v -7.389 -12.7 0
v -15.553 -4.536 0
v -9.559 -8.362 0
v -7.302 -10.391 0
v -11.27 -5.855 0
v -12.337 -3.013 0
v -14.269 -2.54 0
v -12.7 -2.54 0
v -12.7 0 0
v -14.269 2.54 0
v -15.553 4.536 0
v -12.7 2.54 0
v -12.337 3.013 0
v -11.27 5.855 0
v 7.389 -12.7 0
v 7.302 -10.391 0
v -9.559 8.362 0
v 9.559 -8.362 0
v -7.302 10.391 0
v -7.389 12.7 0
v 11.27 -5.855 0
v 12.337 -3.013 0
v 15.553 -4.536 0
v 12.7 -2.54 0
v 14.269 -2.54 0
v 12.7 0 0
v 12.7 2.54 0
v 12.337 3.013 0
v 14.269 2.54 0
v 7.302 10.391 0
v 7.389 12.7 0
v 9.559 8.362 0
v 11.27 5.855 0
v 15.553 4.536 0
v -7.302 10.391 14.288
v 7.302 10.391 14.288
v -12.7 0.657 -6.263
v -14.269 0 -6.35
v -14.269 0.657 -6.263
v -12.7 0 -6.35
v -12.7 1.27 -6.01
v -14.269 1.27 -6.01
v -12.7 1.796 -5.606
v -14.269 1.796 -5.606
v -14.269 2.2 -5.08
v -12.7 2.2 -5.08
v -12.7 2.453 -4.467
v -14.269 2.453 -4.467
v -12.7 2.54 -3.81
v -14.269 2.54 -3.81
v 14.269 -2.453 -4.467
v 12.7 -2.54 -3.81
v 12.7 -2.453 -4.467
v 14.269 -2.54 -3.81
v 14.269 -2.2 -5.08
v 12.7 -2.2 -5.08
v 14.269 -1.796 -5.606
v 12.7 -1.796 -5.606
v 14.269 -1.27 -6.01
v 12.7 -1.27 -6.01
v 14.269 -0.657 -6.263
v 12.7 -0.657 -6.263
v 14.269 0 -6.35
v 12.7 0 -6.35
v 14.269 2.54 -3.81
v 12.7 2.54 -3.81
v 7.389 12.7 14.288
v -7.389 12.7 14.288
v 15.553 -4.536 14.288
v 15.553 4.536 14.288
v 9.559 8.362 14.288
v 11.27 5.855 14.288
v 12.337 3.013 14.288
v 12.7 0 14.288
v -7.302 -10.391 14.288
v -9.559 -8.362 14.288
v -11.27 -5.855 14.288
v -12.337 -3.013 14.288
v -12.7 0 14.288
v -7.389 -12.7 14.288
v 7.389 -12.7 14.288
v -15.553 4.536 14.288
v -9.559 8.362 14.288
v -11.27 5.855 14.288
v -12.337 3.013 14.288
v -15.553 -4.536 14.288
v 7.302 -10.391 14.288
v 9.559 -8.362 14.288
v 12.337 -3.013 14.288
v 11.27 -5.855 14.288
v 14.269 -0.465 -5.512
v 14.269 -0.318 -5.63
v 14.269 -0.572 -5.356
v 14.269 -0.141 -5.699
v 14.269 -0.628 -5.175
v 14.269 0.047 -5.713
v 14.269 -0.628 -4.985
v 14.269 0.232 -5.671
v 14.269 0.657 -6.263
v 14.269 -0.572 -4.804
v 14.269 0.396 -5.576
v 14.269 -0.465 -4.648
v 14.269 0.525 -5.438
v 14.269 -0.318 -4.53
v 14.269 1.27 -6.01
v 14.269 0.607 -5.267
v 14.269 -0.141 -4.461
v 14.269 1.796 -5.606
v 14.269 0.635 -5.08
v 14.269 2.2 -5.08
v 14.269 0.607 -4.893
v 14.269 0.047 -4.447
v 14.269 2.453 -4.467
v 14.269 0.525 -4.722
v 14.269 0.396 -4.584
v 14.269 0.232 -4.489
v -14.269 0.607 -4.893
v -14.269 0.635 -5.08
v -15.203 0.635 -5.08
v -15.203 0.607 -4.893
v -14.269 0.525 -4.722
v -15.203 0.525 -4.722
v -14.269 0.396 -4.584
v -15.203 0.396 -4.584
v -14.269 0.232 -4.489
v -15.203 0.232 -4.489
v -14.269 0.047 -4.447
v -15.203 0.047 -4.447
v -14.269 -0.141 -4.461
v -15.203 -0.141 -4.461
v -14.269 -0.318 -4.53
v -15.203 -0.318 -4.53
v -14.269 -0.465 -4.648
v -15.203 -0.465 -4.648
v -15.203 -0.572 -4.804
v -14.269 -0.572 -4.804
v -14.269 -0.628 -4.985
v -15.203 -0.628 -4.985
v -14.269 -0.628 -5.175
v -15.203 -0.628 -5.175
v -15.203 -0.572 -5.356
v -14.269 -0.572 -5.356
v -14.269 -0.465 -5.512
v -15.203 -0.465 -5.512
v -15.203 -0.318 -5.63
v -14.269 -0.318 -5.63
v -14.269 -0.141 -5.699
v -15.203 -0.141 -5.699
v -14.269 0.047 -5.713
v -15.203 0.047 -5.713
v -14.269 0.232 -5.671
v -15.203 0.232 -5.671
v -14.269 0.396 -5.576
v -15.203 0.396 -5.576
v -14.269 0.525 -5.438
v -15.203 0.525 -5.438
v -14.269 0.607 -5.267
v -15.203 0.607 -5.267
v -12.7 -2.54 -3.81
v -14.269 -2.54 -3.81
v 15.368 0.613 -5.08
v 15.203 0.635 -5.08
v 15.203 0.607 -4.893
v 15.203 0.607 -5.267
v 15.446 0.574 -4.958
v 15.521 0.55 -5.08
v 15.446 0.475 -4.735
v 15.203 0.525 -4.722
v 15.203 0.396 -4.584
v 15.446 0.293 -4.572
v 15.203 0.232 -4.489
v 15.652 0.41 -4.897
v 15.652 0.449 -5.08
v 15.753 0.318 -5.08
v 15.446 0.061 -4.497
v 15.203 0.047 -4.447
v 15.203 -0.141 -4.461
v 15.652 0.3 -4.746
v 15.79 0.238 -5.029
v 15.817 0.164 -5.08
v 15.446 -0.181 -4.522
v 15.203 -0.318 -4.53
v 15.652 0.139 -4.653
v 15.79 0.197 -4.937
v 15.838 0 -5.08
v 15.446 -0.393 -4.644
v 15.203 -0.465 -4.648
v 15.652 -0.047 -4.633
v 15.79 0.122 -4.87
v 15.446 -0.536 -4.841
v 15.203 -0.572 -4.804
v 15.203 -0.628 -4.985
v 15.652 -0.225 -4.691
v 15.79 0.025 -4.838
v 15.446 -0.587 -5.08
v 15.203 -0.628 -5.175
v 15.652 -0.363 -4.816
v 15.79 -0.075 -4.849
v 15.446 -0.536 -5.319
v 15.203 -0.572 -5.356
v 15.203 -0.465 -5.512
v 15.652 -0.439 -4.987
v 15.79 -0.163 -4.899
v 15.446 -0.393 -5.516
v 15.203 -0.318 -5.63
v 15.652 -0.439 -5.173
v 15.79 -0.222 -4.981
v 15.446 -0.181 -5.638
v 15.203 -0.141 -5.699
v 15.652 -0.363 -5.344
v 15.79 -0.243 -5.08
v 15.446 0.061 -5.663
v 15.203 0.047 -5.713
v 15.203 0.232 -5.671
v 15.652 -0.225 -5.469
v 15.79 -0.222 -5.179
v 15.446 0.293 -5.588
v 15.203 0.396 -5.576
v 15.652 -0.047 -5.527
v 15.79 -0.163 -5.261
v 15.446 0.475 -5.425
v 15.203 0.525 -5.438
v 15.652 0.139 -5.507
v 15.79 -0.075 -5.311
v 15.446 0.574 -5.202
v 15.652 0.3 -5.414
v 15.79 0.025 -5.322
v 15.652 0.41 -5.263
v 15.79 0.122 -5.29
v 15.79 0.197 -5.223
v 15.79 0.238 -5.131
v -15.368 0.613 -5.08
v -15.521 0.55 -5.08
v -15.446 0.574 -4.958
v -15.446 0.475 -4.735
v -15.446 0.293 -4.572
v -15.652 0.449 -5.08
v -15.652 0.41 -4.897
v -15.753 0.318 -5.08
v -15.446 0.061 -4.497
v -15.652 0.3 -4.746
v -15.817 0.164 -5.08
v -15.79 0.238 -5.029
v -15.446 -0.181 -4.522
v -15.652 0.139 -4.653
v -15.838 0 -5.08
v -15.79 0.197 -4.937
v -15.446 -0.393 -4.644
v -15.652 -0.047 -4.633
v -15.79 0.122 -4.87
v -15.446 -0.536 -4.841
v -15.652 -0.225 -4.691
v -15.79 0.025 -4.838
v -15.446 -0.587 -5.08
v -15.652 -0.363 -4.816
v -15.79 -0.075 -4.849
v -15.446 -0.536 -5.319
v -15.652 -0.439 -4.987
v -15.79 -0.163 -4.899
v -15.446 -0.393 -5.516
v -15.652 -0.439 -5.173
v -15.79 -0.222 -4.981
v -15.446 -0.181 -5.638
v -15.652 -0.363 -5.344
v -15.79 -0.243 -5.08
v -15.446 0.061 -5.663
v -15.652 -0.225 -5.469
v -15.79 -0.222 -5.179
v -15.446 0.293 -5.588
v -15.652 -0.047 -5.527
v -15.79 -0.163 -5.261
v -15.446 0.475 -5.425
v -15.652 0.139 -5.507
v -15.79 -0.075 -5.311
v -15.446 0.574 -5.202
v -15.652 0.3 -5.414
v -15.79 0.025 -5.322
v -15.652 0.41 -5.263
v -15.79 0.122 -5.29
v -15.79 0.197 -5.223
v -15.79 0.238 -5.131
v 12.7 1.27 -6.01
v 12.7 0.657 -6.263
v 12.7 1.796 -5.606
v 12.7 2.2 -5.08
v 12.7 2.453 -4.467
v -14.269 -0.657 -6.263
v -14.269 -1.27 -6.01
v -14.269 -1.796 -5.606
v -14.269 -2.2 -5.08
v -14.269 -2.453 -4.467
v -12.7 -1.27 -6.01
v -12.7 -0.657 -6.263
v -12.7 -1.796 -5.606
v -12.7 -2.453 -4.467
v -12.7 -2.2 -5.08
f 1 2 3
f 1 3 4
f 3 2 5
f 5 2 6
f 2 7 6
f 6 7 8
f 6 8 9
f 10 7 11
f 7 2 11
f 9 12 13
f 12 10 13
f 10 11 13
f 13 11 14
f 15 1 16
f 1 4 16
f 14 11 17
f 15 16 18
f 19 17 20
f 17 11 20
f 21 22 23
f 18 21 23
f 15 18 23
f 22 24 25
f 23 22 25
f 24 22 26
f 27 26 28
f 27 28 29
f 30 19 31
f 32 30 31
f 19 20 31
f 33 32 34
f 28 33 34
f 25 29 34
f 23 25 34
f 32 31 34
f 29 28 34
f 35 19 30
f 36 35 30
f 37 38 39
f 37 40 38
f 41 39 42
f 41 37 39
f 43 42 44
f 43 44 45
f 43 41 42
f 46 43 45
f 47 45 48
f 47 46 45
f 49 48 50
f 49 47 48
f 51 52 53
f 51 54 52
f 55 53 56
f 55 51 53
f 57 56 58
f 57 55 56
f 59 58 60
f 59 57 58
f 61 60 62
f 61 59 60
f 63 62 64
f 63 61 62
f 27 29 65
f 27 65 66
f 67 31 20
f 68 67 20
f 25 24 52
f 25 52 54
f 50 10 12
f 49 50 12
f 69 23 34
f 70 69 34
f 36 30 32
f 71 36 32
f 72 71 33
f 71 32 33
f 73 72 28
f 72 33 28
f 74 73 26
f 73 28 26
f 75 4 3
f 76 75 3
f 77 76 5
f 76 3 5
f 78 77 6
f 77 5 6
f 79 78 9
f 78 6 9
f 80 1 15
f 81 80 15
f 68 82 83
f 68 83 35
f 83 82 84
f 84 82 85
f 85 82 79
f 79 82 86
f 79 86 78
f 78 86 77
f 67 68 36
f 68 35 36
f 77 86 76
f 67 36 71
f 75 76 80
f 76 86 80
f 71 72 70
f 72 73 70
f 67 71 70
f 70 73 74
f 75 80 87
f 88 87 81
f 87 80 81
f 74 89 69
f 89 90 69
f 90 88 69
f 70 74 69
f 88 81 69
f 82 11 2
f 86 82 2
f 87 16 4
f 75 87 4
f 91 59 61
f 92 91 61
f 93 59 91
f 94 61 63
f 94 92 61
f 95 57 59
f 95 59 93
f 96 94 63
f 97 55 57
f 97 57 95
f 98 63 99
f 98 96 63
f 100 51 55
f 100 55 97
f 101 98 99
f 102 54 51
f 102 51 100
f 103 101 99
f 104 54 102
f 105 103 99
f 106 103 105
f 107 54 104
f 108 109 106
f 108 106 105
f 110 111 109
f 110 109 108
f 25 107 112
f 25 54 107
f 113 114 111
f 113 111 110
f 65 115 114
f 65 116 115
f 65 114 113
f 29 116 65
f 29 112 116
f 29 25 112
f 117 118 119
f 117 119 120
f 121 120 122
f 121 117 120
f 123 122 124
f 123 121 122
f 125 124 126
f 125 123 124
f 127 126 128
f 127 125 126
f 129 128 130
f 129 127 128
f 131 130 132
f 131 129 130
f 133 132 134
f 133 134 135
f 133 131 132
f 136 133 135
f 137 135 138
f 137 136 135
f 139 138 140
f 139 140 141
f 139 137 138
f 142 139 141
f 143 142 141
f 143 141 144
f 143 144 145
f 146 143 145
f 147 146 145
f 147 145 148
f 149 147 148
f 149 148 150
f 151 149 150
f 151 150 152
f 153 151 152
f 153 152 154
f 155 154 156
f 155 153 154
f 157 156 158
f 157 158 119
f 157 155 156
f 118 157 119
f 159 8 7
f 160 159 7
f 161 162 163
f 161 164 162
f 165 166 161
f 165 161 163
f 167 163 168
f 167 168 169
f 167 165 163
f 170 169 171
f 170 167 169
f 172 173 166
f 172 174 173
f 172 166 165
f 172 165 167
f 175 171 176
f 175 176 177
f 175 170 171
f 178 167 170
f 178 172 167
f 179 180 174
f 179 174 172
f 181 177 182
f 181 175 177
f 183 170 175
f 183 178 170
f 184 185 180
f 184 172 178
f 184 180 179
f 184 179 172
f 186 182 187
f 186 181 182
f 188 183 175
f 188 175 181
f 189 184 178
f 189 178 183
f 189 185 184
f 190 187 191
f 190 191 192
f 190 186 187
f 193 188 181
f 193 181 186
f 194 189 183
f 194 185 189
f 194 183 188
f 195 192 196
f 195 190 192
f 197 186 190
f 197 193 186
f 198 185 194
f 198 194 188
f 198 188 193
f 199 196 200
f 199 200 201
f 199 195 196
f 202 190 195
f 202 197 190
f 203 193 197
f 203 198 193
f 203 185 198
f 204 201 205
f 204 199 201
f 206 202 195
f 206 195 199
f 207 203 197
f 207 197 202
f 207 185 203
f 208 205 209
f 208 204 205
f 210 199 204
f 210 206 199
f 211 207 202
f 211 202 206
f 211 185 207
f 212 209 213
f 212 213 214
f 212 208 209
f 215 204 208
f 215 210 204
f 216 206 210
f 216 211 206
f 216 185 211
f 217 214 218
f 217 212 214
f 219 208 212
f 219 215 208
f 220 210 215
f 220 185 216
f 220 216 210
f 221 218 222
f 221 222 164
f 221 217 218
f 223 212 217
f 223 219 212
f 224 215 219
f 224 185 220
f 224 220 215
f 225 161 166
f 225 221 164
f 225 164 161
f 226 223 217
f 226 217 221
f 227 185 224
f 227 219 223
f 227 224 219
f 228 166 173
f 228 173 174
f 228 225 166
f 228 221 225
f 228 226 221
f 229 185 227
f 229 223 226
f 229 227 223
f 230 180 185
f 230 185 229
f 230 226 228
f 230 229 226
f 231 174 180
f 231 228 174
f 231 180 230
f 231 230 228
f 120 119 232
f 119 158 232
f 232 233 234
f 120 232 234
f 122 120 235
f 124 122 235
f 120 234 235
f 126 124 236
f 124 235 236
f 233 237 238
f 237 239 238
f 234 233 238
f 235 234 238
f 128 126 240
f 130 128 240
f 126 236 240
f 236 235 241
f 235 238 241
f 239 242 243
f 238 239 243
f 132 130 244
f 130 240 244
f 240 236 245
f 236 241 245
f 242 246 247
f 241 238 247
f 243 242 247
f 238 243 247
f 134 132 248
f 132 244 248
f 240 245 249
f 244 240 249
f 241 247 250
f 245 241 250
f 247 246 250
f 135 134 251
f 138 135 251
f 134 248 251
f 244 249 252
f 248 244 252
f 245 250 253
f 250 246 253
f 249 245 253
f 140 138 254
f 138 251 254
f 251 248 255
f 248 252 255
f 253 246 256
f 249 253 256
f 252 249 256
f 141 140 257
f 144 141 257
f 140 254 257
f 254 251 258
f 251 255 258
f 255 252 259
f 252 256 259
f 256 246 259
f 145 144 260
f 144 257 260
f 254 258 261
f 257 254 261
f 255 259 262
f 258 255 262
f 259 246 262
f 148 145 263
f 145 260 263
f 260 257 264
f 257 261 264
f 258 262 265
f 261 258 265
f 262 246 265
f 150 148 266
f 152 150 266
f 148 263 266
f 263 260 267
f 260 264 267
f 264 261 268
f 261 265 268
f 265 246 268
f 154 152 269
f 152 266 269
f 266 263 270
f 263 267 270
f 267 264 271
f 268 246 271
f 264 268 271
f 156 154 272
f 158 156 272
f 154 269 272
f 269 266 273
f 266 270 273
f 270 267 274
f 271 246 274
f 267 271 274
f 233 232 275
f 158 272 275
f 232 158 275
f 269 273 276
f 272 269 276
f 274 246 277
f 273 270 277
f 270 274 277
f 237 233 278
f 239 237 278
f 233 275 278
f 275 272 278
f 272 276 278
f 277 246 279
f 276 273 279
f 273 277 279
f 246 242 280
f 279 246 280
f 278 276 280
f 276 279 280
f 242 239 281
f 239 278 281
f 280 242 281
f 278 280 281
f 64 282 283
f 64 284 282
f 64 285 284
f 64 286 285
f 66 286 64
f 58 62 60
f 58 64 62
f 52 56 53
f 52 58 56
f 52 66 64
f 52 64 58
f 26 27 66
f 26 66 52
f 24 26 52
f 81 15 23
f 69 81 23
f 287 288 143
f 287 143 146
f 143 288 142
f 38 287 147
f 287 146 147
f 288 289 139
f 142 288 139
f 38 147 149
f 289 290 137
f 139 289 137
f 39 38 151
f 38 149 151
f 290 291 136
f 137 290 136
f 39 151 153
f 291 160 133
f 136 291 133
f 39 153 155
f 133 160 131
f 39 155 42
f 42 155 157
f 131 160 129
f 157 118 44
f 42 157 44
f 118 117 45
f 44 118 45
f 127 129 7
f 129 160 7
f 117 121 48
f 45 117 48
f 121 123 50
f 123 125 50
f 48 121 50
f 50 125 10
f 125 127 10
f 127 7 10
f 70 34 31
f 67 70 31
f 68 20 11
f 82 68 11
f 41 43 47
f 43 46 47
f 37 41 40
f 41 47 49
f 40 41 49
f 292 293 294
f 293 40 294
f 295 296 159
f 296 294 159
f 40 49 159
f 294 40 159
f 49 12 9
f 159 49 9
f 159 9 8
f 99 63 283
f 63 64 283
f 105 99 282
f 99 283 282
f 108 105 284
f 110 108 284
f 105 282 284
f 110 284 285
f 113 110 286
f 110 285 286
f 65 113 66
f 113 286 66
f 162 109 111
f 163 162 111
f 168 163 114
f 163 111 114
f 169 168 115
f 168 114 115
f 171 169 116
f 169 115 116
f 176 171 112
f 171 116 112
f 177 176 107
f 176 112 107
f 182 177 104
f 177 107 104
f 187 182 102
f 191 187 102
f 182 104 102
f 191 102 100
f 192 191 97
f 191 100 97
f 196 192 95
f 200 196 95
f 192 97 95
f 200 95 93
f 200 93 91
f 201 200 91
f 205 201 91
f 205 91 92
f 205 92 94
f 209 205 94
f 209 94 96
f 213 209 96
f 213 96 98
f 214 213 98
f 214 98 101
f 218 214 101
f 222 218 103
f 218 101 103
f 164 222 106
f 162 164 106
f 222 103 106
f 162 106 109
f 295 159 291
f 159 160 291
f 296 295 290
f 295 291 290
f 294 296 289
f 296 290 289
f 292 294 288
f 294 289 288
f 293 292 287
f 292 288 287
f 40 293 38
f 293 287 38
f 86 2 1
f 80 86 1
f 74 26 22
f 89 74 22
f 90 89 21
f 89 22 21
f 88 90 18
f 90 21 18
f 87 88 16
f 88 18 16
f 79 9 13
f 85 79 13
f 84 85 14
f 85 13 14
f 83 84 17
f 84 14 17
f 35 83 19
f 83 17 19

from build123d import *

# Parameters (mm, degrees)
F1_DEPTH  = 28.575
F3_DEPTH  = 6.35
F4_R      = 0.635
F5_DEPTH  = 1.5691231
F6_R      = 2.53999
F7_R      = 0.635
F9_DEPTH  = 6.35
F11_D     = 2.54
F16_D     = 127
F16_DEPTH = 20.6385


# Not quite as in the source:
# - a fillet or chamfer is up to 0.001 mm smaller than in the source, because OpenCascade refuses the exact size
# - a length typed as a fraction of an inch, garbled in the dataset ("3 / 203.2 mm" for 3/8 in), is restored
# - the program builds the solid bodies; features that only make, move or delete a surface that nothing else refers to are left out


with BuildPart() as f1:
    # F0 (on Top) → F1 (new body)
    with BuildSketch(Plane.XY):
        Polygon((7.3890909091, 12.7), (0, 12.7), (-7.3890909091, 12.7), (-15.5529601101, 4.536130799), (-15.5529601101, 0), (-15.5529601101, -4.536130799), (-7.3890909091, -12.7), (0, -12.7), (7.3890909091, -12.7), (15.5529601101, -4.536130799), (15.5529601101, 0), (15.5529601101, 4.536130799), align=None)
        with BuildLine():
            ThreePointArc((7.3019865971, 10.3909090909), (11.269987351, 5.8546891556), (12.7, 0))
            ThreePointArc((12.7, 0), (11.269987351, -5.8546891556), (7.3019865971, -10.3909090909))
            Line((7.3019865971, -10.3909090909), (0, -10.3909090909))
            Line((0, -10.3909090909), (-7.3019865971, -10.3909090909))
            ThreePointArc((-7.3019865971, -10.3909090909), (-11.269987351, -5.8546891556), (-12.7, 0))
            ThreePointArc((-12.7, 0), (-11.269987351, 5.8546891556), (-7.3019865971, 10.3909090909))
            Line((-7.3019865971, 10.3909090909), (0, 10.3909090909))
            Line((0, 10.3909090909), (7.3019865971, 10.3909090909))
        make_face(mode=Mode.SUBTRACT)
    extrude(amount=F1_DEPTH)

    # F2 (on Top) → F3 (join)
    with BuildSketch(Plane.XY):
        Polygon((14.2691231, -2.54), (14.2691231, 0), (14.2691231, 2.54), (12.7, 2.54), (12.7, 0), (12.7, -2.54), align=None)
    extrude(amount=-F3_DEPTH)

    # F4 (on face) → F5 (join)
    with BuildSketch(Plane.YZ.offset(14.2691231)):
        with Locations((0, -5.08)):
            Circle(F4_R)
    extrude(amount=F5_DEPTH)

    # F6 (radius 2.54 in the source; OpenCascade refuses exactly that, so slightly less here)
    f6_edges = [f1.edges().sort_by_distance(p)[0] for p in [
        (13.484562, -2.54, -6.35),
        (13.484562, 2.54, -6.35),
    ]]
    fillet(f6_edges, radius=F6_R)

    # F7
    f7_edges = [f1.edges().sort_by_distance(p)[0] for p in [
        (15.838246, -0.635, -5.08),
    ]]
    fillet(f7_edges, radius=F7_R)

    # F8 (on face) → F9 (join)
    with BuildSketch(Plane.XY.offset(28.575)):
        Polygon((15.5529601101, 2.54), (13.9838320495, 2.54), (13.9838320495, 0), (13.9838320495, -2.54), (15.5529601101, -2.54), (15.5529601101, 0), align=None)
    extrude(amount=F9_DEPTH)

    # F11 (through all)
    with Locations(Plane.YZ.offset(15.5529601101)):
        with Locations((0, 32.385)):
            Hole(F11_D / 2)

    # F12: F1 across plane


with BuildPart() as f1_1:
    add(f1.part)
    add(f1.part.mirror(Plane.YZ))

    # F16 (through all, one way)
    with BuildSketch(Plane(origin=(0, 0, 14.2875), x_dir=(1, 0, 0), z_dir=(0, 0, -1))):
        with Locations((0, 0)):
            Circle(F16_D / 2)
    extrude(amount=-F16_DEPTH, mode=Mode.SUBTRACT)


solid = f1_1.part
